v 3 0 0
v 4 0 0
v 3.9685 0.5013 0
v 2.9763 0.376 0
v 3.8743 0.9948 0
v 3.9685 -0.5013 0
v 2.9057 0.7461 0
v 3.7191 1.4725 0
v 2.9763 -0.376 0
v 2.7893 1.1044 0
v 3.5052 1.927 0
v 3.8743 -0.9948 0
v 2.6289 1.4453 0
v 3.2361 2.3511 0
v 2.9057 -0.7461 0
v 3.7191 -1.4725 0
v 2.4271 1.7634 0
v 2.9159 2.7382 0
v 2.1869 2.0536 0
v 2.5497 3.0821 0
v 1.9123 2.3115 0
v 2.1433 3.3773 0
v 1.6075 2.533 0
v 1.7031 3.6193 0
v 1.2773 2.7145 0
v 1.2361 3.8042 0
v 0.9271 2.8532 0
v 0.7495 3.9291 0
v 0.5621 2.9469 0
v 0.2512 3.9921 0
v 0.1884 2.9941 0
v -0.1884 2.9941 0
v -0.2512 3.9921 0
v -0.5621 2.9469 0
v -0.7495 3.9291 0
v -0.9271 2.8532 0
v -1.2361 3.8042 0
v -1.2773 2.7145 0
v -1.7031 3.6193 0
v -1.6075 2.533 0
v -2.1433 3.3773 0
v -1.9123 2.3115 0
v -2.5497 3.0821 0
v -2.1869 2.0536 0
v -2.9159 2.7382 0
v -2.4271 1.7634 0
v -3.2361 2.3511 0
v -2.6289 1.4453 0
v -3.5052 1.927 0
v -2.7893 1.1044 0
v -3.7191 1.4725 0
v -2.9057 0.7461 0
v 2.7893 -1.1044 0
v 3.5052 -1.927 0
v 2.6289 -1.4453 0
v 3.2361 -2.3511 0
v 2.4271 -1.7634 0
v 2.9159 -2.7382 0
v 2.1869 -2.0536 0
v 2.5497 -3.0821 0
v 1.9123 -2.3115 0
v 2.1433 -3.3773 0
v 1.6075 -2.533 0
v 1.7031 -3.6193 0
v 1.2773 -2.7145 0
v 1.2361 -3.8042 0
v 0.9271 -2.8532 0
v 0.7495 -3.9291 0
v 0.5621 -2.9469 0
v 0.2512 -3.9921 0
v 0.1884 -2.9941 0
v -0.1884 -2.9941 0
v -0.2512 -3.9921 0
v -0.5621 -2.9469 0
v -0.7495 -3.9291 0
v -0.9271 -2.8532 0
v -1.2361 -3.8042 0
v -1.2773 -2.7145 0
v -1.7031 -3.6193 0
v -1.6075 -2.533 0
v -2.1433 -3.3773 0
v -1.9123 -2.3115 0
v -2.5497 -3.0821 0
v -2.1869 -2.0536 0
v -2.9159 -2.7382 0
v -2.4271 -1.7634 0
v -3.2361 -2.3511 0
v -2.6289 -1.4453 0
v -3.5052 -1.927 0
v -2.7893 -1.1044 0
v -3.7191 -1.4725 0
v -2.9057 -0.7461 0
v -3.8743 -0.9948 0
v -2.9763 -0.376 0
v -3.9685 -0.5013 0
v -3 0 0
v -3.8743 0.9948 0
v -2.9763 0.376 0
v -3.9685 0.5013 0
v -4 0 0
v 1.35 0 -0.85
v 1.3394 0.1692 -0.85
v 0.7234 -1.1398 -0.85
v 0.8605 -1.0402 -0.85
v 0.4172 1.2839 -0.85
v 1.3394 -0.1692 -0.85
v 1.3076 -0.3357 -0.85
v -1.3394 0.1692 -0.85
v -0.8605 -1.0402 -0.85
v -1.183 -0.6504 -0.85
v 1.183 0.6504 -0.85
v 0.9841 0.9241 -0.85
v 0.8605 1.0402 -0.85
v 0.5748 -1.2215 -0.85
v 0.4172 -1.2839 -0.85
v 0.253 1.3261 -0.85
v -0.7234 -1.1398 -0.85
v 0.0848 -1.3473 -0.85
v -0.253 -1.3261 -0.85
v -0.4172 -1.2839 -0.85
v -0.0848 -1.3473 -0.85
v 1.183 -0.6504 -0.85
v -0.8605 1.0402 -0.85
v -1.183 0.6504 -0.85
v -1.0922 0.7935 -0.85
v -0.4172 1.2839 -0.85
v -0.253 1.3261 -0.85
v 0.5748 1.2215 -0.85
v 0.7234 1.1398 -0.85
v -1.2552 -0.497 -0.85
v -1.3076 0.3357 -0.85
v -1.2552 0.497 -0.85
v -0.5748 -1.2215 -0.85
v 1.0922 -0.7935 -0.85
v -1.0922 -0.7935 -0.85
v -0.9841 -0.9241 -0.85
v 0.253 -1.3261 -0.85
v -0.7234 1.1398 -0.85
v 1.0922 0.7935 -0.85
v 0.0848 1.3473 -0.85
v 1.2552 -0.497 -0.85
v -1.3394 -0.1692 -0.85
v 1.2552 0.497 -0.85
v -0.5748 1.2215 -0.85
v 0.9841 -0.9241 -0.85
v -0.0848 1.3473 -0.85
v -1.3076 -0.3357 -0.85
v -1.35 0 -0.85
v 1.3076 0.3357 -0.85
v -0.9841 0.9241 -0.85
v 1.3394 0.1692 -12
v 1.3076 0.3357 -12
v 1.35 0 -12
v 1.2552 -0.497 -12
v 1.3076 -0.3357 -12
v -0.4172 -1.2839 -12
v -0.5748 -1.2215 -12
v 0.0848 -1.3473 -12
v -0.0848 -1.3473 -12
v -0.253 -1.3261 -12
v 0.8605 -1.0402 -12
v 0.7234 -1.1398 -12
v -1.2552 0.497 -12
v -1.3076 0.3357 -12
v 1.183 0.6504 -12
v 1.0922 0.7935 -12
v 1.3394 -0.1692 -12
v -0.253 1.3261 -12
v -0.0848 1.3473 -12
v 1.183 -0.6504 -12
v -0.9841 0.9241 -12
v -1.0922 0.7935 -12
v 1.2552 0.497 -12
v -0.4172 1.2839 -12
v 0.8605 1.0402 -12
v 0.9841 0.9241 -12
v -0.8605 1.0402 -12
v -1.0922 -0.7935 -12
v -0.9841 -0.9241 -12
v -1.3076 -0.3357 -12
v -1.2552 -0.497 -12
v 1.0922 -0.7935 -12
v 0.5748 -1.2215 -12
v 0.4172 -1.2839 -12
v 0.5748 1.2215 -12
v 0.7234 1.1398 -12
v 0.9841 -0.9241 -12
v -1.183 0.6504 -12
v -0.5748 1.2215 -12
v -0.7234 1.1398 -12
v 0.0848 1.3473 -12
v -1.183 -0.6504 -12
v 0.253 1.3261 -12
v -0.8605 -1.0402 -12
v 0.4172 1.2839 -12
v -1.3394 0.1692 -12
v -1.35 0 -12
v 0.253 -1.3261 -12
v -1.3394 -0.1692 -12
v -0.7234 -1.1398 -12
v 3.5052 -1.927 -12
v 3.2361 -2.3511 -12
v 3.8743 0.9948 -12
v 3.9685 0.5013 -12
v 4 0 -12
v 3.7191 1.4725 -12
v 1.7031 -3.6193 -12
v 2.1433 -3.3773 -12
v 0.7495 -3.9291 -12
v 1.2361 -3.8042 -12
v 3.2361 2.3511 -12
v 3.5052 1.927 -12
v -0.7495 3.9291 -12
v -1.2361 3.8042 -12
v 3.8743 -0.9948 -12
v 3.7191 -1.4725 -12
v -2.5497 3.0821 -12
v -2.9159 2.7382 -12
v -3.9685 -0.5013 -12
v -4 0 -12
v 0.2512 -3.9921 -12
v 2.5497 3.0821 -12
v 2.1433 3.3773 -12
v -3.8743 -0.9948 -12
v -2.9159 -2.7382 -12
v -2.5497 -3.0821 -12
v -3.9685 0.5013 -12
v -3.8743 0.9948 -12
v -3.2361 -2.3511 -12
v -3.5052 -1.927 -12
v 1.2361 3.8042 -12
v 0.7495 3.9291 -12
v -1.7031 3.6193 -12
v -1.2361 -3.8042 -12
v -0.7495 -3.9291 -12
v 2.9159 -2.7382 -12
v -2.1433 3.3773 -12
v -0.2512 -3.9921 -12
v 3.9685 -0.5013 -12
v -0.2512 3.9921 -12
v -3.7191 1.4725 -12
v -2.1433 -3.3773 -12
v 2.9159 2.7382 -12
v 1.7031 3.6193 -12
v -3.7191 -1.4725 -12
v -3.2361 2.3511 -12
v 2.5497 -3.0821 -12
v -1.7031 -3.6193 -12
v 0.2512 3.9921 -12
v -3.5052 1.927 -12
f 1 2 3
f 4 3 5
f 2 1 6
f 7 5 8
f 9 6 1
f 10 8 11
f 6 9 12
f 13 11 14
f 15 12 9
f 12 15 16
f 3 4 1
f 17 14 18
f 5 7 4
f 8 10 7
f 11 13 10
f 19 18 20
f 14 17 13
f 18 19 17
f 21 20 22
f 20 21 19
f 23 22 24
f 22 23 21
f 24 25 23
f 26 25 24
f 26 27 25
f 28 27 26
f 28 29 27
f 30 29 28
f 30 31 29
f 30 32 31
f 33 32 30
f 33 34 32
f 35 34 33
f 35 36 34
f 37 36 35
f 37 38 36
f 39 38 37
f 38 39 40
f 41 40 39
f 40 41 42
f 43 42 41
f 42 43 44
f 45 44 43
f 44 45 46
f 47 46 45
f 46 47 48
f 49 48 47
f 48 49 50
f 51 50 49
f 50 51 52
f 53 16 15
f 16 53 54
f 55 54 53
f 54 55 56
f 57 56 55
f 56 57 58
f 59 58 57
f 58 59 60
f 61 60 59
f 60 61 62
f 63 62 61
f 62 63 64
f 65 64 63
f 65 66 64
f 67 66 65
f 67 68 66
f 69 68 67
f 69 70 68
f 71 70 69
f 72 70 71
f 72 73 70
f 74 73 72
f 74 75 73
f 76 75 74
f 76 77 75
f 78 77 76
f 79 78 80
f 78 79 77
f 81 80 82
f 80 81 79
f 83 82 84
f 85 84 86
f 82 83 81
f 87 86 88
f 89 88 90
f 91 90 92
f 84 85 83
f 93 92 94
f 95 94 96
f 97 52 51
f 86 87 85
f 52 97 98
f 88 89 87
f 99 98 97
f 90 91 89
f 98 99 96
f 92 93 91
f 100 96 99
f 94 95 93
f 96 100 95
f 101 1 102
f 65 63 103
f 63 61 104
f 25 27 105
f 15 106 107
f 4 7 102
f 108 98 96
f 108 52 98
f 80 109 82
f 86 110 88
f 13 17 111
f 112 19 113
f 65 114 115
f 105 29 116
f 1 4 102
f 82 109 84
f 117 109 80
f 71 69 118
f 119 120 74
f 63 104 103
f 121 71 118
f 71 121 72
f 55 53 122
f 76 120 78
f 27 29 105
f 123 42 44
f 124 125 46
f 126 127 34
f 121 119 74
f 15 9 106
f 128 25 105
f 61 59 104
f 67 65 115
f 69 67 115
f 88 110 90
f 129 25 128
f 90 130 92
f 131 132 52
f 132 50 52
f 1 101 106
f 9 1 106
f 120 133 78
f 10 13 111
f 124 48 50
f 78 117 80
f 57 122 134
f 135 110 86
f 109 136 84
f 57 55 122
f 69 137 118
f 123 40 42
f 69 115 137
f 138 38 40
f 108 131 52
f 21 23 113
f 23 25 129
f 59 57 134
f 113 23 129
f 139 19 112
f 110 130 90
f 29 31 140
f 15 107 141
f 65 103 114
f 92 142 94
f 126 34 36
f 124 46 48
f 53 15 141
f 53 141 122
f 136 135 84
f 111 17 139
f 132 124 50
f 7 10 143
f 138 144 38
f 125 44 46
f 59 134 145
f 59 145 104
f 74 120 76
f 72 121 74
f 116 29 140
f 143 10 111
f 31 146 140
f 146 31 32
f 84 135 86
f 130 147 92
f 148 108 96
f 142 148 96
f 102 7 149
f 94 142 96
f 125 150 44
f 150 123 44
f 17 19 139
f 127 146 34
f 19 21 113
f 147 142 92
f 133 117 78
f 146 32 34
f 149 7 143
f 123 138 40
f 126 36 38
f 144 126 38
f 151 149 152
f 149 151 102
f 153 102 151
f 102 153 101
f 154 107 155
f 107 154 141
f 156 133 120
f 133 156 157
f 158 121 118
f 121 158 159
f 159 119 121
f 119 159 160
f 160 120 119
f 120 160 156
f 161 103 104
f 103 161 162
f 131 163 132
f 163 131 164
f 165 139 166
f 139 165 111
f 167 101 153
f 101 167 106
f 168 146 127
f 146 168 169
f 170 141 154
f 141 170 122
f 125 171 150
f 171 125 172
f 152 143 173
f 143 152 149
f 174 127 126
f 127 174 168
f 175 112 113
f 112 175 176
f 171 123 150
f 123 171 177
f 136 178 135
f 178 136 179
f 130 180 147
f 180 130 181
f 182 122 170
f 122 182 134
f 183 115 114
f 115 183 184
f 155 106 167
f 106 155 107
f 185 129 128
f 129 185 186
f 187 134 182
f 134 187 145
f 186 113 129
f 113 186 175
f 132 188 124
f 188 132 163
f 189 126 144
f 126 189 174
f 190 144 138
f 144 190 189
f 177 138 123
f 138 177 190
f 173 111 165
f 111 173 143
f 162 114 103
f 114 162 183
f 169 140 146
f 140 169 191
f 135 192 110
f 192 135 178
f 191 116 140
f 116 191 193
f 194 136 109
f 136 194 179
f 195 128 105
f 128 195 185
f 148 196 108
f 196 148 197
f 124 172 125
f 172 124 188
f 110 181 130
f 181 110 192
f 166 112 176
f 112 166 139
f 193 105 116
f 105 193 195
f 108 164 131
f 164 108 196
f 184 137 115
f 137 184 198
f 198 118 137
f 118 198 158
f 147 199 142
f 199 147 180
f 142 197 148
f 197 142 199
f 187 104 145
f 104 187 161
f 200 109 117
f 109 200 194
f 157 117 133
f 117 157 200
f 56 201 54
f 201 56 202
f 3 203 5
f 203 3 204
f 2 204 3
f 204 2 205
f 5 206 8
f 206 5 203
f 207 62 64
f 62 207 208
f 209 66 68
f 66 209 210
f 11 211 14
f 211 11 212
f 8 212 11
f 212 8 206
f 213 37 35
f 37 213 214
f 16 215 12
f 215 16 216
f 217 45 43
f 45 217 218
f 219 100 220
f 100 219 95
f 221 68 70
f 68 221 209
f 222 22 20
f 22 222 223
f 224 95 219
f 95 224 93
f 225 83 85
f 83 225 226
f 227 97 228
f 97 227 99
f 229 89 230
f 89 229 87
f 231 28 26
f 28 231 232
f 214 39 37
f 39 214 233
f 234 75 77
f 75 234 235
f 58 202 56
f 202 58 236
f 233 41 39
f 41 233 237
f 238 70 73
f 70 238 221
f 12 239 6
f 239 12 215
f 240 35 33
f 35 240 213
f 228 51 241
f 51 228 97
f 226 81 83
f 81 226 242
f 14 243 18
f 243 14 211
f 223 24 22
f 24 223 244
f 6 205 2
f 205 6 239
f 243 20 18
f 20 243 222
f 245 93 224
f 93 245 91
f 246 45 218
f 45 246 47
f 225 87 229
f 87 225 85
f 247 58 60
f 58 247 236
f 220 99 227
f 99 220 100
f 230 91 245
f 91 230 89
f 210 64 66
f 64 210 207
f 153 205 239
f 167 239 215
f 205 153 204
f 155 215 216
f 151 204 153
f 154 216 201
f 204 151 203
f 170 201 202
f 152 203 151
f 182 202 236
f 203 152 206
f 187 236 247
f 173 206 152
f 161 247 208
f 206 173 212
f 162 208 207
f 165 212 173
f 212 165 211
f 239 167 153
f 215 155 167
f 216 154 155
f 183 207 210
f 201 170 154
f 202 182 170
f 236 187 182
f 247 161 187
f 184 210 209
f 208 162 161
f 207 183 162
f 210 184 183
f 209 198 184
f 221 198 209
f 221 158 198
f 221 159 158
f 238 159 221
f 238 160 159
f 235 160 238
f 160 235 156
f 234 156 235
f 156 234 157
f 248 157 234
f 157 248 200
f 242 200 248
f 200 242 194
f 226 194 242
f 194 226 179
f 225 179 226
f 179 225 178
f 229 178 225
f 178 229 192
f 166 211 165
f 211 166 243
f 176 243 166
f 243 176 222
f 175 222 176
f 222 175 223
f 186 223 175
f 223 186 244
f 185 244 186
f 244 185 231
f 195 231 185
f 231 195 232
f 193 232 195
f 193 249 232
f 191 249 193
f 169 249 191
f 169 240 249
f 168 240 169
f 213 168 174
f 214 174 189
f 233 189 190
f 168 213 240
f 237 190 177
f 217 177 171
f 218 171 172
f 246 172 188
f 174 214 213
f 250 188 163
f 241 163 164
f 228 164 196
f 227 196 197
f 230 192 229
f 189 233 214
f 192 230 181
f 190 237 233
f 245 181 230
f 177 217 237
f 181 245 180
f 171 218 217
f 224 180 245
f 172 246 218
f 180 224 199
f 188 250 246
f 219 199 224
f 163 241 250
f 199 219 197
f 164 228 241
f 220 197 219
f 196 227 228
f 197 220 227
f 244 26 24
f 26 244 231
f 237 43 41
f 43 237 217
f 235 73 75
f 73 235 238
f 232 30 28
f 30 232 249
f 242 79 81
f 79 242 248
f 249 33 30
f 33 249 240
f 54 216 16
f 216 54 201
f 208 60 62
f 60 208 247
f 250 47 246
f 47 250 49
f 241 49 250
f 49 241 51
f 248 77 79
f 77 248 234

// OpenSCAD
$fn = 50;

difference() {
	union() {
		translate(v = [0, 0, -12.0]) {
			cylinder(h = 12, r = 4.0);
		}
	}
	union() {
		translate(v = [0, 0, 0]) {
			rotate(a = [0, 0, 0]) {
				difference() {
					union() {
						translate(v = [0, 0, -15.0]) {
							cylinder(h = 15, r = 1.0);
						}
						translate(v = [0, 0, -0.85]) {
							cylinder(h = 0.85, r1 = 1.35, r2 = 3.0);
						}
						translate(v = [0, 0, -15.0]) {
							cylinder(h = 15, r = 1.35);
						}
						translate(v = [0, 0, -15.0]) {
							cylinder(h = 15, r = 1.0);
						}
					}
					union();
				}
			}
		}
	}
}
